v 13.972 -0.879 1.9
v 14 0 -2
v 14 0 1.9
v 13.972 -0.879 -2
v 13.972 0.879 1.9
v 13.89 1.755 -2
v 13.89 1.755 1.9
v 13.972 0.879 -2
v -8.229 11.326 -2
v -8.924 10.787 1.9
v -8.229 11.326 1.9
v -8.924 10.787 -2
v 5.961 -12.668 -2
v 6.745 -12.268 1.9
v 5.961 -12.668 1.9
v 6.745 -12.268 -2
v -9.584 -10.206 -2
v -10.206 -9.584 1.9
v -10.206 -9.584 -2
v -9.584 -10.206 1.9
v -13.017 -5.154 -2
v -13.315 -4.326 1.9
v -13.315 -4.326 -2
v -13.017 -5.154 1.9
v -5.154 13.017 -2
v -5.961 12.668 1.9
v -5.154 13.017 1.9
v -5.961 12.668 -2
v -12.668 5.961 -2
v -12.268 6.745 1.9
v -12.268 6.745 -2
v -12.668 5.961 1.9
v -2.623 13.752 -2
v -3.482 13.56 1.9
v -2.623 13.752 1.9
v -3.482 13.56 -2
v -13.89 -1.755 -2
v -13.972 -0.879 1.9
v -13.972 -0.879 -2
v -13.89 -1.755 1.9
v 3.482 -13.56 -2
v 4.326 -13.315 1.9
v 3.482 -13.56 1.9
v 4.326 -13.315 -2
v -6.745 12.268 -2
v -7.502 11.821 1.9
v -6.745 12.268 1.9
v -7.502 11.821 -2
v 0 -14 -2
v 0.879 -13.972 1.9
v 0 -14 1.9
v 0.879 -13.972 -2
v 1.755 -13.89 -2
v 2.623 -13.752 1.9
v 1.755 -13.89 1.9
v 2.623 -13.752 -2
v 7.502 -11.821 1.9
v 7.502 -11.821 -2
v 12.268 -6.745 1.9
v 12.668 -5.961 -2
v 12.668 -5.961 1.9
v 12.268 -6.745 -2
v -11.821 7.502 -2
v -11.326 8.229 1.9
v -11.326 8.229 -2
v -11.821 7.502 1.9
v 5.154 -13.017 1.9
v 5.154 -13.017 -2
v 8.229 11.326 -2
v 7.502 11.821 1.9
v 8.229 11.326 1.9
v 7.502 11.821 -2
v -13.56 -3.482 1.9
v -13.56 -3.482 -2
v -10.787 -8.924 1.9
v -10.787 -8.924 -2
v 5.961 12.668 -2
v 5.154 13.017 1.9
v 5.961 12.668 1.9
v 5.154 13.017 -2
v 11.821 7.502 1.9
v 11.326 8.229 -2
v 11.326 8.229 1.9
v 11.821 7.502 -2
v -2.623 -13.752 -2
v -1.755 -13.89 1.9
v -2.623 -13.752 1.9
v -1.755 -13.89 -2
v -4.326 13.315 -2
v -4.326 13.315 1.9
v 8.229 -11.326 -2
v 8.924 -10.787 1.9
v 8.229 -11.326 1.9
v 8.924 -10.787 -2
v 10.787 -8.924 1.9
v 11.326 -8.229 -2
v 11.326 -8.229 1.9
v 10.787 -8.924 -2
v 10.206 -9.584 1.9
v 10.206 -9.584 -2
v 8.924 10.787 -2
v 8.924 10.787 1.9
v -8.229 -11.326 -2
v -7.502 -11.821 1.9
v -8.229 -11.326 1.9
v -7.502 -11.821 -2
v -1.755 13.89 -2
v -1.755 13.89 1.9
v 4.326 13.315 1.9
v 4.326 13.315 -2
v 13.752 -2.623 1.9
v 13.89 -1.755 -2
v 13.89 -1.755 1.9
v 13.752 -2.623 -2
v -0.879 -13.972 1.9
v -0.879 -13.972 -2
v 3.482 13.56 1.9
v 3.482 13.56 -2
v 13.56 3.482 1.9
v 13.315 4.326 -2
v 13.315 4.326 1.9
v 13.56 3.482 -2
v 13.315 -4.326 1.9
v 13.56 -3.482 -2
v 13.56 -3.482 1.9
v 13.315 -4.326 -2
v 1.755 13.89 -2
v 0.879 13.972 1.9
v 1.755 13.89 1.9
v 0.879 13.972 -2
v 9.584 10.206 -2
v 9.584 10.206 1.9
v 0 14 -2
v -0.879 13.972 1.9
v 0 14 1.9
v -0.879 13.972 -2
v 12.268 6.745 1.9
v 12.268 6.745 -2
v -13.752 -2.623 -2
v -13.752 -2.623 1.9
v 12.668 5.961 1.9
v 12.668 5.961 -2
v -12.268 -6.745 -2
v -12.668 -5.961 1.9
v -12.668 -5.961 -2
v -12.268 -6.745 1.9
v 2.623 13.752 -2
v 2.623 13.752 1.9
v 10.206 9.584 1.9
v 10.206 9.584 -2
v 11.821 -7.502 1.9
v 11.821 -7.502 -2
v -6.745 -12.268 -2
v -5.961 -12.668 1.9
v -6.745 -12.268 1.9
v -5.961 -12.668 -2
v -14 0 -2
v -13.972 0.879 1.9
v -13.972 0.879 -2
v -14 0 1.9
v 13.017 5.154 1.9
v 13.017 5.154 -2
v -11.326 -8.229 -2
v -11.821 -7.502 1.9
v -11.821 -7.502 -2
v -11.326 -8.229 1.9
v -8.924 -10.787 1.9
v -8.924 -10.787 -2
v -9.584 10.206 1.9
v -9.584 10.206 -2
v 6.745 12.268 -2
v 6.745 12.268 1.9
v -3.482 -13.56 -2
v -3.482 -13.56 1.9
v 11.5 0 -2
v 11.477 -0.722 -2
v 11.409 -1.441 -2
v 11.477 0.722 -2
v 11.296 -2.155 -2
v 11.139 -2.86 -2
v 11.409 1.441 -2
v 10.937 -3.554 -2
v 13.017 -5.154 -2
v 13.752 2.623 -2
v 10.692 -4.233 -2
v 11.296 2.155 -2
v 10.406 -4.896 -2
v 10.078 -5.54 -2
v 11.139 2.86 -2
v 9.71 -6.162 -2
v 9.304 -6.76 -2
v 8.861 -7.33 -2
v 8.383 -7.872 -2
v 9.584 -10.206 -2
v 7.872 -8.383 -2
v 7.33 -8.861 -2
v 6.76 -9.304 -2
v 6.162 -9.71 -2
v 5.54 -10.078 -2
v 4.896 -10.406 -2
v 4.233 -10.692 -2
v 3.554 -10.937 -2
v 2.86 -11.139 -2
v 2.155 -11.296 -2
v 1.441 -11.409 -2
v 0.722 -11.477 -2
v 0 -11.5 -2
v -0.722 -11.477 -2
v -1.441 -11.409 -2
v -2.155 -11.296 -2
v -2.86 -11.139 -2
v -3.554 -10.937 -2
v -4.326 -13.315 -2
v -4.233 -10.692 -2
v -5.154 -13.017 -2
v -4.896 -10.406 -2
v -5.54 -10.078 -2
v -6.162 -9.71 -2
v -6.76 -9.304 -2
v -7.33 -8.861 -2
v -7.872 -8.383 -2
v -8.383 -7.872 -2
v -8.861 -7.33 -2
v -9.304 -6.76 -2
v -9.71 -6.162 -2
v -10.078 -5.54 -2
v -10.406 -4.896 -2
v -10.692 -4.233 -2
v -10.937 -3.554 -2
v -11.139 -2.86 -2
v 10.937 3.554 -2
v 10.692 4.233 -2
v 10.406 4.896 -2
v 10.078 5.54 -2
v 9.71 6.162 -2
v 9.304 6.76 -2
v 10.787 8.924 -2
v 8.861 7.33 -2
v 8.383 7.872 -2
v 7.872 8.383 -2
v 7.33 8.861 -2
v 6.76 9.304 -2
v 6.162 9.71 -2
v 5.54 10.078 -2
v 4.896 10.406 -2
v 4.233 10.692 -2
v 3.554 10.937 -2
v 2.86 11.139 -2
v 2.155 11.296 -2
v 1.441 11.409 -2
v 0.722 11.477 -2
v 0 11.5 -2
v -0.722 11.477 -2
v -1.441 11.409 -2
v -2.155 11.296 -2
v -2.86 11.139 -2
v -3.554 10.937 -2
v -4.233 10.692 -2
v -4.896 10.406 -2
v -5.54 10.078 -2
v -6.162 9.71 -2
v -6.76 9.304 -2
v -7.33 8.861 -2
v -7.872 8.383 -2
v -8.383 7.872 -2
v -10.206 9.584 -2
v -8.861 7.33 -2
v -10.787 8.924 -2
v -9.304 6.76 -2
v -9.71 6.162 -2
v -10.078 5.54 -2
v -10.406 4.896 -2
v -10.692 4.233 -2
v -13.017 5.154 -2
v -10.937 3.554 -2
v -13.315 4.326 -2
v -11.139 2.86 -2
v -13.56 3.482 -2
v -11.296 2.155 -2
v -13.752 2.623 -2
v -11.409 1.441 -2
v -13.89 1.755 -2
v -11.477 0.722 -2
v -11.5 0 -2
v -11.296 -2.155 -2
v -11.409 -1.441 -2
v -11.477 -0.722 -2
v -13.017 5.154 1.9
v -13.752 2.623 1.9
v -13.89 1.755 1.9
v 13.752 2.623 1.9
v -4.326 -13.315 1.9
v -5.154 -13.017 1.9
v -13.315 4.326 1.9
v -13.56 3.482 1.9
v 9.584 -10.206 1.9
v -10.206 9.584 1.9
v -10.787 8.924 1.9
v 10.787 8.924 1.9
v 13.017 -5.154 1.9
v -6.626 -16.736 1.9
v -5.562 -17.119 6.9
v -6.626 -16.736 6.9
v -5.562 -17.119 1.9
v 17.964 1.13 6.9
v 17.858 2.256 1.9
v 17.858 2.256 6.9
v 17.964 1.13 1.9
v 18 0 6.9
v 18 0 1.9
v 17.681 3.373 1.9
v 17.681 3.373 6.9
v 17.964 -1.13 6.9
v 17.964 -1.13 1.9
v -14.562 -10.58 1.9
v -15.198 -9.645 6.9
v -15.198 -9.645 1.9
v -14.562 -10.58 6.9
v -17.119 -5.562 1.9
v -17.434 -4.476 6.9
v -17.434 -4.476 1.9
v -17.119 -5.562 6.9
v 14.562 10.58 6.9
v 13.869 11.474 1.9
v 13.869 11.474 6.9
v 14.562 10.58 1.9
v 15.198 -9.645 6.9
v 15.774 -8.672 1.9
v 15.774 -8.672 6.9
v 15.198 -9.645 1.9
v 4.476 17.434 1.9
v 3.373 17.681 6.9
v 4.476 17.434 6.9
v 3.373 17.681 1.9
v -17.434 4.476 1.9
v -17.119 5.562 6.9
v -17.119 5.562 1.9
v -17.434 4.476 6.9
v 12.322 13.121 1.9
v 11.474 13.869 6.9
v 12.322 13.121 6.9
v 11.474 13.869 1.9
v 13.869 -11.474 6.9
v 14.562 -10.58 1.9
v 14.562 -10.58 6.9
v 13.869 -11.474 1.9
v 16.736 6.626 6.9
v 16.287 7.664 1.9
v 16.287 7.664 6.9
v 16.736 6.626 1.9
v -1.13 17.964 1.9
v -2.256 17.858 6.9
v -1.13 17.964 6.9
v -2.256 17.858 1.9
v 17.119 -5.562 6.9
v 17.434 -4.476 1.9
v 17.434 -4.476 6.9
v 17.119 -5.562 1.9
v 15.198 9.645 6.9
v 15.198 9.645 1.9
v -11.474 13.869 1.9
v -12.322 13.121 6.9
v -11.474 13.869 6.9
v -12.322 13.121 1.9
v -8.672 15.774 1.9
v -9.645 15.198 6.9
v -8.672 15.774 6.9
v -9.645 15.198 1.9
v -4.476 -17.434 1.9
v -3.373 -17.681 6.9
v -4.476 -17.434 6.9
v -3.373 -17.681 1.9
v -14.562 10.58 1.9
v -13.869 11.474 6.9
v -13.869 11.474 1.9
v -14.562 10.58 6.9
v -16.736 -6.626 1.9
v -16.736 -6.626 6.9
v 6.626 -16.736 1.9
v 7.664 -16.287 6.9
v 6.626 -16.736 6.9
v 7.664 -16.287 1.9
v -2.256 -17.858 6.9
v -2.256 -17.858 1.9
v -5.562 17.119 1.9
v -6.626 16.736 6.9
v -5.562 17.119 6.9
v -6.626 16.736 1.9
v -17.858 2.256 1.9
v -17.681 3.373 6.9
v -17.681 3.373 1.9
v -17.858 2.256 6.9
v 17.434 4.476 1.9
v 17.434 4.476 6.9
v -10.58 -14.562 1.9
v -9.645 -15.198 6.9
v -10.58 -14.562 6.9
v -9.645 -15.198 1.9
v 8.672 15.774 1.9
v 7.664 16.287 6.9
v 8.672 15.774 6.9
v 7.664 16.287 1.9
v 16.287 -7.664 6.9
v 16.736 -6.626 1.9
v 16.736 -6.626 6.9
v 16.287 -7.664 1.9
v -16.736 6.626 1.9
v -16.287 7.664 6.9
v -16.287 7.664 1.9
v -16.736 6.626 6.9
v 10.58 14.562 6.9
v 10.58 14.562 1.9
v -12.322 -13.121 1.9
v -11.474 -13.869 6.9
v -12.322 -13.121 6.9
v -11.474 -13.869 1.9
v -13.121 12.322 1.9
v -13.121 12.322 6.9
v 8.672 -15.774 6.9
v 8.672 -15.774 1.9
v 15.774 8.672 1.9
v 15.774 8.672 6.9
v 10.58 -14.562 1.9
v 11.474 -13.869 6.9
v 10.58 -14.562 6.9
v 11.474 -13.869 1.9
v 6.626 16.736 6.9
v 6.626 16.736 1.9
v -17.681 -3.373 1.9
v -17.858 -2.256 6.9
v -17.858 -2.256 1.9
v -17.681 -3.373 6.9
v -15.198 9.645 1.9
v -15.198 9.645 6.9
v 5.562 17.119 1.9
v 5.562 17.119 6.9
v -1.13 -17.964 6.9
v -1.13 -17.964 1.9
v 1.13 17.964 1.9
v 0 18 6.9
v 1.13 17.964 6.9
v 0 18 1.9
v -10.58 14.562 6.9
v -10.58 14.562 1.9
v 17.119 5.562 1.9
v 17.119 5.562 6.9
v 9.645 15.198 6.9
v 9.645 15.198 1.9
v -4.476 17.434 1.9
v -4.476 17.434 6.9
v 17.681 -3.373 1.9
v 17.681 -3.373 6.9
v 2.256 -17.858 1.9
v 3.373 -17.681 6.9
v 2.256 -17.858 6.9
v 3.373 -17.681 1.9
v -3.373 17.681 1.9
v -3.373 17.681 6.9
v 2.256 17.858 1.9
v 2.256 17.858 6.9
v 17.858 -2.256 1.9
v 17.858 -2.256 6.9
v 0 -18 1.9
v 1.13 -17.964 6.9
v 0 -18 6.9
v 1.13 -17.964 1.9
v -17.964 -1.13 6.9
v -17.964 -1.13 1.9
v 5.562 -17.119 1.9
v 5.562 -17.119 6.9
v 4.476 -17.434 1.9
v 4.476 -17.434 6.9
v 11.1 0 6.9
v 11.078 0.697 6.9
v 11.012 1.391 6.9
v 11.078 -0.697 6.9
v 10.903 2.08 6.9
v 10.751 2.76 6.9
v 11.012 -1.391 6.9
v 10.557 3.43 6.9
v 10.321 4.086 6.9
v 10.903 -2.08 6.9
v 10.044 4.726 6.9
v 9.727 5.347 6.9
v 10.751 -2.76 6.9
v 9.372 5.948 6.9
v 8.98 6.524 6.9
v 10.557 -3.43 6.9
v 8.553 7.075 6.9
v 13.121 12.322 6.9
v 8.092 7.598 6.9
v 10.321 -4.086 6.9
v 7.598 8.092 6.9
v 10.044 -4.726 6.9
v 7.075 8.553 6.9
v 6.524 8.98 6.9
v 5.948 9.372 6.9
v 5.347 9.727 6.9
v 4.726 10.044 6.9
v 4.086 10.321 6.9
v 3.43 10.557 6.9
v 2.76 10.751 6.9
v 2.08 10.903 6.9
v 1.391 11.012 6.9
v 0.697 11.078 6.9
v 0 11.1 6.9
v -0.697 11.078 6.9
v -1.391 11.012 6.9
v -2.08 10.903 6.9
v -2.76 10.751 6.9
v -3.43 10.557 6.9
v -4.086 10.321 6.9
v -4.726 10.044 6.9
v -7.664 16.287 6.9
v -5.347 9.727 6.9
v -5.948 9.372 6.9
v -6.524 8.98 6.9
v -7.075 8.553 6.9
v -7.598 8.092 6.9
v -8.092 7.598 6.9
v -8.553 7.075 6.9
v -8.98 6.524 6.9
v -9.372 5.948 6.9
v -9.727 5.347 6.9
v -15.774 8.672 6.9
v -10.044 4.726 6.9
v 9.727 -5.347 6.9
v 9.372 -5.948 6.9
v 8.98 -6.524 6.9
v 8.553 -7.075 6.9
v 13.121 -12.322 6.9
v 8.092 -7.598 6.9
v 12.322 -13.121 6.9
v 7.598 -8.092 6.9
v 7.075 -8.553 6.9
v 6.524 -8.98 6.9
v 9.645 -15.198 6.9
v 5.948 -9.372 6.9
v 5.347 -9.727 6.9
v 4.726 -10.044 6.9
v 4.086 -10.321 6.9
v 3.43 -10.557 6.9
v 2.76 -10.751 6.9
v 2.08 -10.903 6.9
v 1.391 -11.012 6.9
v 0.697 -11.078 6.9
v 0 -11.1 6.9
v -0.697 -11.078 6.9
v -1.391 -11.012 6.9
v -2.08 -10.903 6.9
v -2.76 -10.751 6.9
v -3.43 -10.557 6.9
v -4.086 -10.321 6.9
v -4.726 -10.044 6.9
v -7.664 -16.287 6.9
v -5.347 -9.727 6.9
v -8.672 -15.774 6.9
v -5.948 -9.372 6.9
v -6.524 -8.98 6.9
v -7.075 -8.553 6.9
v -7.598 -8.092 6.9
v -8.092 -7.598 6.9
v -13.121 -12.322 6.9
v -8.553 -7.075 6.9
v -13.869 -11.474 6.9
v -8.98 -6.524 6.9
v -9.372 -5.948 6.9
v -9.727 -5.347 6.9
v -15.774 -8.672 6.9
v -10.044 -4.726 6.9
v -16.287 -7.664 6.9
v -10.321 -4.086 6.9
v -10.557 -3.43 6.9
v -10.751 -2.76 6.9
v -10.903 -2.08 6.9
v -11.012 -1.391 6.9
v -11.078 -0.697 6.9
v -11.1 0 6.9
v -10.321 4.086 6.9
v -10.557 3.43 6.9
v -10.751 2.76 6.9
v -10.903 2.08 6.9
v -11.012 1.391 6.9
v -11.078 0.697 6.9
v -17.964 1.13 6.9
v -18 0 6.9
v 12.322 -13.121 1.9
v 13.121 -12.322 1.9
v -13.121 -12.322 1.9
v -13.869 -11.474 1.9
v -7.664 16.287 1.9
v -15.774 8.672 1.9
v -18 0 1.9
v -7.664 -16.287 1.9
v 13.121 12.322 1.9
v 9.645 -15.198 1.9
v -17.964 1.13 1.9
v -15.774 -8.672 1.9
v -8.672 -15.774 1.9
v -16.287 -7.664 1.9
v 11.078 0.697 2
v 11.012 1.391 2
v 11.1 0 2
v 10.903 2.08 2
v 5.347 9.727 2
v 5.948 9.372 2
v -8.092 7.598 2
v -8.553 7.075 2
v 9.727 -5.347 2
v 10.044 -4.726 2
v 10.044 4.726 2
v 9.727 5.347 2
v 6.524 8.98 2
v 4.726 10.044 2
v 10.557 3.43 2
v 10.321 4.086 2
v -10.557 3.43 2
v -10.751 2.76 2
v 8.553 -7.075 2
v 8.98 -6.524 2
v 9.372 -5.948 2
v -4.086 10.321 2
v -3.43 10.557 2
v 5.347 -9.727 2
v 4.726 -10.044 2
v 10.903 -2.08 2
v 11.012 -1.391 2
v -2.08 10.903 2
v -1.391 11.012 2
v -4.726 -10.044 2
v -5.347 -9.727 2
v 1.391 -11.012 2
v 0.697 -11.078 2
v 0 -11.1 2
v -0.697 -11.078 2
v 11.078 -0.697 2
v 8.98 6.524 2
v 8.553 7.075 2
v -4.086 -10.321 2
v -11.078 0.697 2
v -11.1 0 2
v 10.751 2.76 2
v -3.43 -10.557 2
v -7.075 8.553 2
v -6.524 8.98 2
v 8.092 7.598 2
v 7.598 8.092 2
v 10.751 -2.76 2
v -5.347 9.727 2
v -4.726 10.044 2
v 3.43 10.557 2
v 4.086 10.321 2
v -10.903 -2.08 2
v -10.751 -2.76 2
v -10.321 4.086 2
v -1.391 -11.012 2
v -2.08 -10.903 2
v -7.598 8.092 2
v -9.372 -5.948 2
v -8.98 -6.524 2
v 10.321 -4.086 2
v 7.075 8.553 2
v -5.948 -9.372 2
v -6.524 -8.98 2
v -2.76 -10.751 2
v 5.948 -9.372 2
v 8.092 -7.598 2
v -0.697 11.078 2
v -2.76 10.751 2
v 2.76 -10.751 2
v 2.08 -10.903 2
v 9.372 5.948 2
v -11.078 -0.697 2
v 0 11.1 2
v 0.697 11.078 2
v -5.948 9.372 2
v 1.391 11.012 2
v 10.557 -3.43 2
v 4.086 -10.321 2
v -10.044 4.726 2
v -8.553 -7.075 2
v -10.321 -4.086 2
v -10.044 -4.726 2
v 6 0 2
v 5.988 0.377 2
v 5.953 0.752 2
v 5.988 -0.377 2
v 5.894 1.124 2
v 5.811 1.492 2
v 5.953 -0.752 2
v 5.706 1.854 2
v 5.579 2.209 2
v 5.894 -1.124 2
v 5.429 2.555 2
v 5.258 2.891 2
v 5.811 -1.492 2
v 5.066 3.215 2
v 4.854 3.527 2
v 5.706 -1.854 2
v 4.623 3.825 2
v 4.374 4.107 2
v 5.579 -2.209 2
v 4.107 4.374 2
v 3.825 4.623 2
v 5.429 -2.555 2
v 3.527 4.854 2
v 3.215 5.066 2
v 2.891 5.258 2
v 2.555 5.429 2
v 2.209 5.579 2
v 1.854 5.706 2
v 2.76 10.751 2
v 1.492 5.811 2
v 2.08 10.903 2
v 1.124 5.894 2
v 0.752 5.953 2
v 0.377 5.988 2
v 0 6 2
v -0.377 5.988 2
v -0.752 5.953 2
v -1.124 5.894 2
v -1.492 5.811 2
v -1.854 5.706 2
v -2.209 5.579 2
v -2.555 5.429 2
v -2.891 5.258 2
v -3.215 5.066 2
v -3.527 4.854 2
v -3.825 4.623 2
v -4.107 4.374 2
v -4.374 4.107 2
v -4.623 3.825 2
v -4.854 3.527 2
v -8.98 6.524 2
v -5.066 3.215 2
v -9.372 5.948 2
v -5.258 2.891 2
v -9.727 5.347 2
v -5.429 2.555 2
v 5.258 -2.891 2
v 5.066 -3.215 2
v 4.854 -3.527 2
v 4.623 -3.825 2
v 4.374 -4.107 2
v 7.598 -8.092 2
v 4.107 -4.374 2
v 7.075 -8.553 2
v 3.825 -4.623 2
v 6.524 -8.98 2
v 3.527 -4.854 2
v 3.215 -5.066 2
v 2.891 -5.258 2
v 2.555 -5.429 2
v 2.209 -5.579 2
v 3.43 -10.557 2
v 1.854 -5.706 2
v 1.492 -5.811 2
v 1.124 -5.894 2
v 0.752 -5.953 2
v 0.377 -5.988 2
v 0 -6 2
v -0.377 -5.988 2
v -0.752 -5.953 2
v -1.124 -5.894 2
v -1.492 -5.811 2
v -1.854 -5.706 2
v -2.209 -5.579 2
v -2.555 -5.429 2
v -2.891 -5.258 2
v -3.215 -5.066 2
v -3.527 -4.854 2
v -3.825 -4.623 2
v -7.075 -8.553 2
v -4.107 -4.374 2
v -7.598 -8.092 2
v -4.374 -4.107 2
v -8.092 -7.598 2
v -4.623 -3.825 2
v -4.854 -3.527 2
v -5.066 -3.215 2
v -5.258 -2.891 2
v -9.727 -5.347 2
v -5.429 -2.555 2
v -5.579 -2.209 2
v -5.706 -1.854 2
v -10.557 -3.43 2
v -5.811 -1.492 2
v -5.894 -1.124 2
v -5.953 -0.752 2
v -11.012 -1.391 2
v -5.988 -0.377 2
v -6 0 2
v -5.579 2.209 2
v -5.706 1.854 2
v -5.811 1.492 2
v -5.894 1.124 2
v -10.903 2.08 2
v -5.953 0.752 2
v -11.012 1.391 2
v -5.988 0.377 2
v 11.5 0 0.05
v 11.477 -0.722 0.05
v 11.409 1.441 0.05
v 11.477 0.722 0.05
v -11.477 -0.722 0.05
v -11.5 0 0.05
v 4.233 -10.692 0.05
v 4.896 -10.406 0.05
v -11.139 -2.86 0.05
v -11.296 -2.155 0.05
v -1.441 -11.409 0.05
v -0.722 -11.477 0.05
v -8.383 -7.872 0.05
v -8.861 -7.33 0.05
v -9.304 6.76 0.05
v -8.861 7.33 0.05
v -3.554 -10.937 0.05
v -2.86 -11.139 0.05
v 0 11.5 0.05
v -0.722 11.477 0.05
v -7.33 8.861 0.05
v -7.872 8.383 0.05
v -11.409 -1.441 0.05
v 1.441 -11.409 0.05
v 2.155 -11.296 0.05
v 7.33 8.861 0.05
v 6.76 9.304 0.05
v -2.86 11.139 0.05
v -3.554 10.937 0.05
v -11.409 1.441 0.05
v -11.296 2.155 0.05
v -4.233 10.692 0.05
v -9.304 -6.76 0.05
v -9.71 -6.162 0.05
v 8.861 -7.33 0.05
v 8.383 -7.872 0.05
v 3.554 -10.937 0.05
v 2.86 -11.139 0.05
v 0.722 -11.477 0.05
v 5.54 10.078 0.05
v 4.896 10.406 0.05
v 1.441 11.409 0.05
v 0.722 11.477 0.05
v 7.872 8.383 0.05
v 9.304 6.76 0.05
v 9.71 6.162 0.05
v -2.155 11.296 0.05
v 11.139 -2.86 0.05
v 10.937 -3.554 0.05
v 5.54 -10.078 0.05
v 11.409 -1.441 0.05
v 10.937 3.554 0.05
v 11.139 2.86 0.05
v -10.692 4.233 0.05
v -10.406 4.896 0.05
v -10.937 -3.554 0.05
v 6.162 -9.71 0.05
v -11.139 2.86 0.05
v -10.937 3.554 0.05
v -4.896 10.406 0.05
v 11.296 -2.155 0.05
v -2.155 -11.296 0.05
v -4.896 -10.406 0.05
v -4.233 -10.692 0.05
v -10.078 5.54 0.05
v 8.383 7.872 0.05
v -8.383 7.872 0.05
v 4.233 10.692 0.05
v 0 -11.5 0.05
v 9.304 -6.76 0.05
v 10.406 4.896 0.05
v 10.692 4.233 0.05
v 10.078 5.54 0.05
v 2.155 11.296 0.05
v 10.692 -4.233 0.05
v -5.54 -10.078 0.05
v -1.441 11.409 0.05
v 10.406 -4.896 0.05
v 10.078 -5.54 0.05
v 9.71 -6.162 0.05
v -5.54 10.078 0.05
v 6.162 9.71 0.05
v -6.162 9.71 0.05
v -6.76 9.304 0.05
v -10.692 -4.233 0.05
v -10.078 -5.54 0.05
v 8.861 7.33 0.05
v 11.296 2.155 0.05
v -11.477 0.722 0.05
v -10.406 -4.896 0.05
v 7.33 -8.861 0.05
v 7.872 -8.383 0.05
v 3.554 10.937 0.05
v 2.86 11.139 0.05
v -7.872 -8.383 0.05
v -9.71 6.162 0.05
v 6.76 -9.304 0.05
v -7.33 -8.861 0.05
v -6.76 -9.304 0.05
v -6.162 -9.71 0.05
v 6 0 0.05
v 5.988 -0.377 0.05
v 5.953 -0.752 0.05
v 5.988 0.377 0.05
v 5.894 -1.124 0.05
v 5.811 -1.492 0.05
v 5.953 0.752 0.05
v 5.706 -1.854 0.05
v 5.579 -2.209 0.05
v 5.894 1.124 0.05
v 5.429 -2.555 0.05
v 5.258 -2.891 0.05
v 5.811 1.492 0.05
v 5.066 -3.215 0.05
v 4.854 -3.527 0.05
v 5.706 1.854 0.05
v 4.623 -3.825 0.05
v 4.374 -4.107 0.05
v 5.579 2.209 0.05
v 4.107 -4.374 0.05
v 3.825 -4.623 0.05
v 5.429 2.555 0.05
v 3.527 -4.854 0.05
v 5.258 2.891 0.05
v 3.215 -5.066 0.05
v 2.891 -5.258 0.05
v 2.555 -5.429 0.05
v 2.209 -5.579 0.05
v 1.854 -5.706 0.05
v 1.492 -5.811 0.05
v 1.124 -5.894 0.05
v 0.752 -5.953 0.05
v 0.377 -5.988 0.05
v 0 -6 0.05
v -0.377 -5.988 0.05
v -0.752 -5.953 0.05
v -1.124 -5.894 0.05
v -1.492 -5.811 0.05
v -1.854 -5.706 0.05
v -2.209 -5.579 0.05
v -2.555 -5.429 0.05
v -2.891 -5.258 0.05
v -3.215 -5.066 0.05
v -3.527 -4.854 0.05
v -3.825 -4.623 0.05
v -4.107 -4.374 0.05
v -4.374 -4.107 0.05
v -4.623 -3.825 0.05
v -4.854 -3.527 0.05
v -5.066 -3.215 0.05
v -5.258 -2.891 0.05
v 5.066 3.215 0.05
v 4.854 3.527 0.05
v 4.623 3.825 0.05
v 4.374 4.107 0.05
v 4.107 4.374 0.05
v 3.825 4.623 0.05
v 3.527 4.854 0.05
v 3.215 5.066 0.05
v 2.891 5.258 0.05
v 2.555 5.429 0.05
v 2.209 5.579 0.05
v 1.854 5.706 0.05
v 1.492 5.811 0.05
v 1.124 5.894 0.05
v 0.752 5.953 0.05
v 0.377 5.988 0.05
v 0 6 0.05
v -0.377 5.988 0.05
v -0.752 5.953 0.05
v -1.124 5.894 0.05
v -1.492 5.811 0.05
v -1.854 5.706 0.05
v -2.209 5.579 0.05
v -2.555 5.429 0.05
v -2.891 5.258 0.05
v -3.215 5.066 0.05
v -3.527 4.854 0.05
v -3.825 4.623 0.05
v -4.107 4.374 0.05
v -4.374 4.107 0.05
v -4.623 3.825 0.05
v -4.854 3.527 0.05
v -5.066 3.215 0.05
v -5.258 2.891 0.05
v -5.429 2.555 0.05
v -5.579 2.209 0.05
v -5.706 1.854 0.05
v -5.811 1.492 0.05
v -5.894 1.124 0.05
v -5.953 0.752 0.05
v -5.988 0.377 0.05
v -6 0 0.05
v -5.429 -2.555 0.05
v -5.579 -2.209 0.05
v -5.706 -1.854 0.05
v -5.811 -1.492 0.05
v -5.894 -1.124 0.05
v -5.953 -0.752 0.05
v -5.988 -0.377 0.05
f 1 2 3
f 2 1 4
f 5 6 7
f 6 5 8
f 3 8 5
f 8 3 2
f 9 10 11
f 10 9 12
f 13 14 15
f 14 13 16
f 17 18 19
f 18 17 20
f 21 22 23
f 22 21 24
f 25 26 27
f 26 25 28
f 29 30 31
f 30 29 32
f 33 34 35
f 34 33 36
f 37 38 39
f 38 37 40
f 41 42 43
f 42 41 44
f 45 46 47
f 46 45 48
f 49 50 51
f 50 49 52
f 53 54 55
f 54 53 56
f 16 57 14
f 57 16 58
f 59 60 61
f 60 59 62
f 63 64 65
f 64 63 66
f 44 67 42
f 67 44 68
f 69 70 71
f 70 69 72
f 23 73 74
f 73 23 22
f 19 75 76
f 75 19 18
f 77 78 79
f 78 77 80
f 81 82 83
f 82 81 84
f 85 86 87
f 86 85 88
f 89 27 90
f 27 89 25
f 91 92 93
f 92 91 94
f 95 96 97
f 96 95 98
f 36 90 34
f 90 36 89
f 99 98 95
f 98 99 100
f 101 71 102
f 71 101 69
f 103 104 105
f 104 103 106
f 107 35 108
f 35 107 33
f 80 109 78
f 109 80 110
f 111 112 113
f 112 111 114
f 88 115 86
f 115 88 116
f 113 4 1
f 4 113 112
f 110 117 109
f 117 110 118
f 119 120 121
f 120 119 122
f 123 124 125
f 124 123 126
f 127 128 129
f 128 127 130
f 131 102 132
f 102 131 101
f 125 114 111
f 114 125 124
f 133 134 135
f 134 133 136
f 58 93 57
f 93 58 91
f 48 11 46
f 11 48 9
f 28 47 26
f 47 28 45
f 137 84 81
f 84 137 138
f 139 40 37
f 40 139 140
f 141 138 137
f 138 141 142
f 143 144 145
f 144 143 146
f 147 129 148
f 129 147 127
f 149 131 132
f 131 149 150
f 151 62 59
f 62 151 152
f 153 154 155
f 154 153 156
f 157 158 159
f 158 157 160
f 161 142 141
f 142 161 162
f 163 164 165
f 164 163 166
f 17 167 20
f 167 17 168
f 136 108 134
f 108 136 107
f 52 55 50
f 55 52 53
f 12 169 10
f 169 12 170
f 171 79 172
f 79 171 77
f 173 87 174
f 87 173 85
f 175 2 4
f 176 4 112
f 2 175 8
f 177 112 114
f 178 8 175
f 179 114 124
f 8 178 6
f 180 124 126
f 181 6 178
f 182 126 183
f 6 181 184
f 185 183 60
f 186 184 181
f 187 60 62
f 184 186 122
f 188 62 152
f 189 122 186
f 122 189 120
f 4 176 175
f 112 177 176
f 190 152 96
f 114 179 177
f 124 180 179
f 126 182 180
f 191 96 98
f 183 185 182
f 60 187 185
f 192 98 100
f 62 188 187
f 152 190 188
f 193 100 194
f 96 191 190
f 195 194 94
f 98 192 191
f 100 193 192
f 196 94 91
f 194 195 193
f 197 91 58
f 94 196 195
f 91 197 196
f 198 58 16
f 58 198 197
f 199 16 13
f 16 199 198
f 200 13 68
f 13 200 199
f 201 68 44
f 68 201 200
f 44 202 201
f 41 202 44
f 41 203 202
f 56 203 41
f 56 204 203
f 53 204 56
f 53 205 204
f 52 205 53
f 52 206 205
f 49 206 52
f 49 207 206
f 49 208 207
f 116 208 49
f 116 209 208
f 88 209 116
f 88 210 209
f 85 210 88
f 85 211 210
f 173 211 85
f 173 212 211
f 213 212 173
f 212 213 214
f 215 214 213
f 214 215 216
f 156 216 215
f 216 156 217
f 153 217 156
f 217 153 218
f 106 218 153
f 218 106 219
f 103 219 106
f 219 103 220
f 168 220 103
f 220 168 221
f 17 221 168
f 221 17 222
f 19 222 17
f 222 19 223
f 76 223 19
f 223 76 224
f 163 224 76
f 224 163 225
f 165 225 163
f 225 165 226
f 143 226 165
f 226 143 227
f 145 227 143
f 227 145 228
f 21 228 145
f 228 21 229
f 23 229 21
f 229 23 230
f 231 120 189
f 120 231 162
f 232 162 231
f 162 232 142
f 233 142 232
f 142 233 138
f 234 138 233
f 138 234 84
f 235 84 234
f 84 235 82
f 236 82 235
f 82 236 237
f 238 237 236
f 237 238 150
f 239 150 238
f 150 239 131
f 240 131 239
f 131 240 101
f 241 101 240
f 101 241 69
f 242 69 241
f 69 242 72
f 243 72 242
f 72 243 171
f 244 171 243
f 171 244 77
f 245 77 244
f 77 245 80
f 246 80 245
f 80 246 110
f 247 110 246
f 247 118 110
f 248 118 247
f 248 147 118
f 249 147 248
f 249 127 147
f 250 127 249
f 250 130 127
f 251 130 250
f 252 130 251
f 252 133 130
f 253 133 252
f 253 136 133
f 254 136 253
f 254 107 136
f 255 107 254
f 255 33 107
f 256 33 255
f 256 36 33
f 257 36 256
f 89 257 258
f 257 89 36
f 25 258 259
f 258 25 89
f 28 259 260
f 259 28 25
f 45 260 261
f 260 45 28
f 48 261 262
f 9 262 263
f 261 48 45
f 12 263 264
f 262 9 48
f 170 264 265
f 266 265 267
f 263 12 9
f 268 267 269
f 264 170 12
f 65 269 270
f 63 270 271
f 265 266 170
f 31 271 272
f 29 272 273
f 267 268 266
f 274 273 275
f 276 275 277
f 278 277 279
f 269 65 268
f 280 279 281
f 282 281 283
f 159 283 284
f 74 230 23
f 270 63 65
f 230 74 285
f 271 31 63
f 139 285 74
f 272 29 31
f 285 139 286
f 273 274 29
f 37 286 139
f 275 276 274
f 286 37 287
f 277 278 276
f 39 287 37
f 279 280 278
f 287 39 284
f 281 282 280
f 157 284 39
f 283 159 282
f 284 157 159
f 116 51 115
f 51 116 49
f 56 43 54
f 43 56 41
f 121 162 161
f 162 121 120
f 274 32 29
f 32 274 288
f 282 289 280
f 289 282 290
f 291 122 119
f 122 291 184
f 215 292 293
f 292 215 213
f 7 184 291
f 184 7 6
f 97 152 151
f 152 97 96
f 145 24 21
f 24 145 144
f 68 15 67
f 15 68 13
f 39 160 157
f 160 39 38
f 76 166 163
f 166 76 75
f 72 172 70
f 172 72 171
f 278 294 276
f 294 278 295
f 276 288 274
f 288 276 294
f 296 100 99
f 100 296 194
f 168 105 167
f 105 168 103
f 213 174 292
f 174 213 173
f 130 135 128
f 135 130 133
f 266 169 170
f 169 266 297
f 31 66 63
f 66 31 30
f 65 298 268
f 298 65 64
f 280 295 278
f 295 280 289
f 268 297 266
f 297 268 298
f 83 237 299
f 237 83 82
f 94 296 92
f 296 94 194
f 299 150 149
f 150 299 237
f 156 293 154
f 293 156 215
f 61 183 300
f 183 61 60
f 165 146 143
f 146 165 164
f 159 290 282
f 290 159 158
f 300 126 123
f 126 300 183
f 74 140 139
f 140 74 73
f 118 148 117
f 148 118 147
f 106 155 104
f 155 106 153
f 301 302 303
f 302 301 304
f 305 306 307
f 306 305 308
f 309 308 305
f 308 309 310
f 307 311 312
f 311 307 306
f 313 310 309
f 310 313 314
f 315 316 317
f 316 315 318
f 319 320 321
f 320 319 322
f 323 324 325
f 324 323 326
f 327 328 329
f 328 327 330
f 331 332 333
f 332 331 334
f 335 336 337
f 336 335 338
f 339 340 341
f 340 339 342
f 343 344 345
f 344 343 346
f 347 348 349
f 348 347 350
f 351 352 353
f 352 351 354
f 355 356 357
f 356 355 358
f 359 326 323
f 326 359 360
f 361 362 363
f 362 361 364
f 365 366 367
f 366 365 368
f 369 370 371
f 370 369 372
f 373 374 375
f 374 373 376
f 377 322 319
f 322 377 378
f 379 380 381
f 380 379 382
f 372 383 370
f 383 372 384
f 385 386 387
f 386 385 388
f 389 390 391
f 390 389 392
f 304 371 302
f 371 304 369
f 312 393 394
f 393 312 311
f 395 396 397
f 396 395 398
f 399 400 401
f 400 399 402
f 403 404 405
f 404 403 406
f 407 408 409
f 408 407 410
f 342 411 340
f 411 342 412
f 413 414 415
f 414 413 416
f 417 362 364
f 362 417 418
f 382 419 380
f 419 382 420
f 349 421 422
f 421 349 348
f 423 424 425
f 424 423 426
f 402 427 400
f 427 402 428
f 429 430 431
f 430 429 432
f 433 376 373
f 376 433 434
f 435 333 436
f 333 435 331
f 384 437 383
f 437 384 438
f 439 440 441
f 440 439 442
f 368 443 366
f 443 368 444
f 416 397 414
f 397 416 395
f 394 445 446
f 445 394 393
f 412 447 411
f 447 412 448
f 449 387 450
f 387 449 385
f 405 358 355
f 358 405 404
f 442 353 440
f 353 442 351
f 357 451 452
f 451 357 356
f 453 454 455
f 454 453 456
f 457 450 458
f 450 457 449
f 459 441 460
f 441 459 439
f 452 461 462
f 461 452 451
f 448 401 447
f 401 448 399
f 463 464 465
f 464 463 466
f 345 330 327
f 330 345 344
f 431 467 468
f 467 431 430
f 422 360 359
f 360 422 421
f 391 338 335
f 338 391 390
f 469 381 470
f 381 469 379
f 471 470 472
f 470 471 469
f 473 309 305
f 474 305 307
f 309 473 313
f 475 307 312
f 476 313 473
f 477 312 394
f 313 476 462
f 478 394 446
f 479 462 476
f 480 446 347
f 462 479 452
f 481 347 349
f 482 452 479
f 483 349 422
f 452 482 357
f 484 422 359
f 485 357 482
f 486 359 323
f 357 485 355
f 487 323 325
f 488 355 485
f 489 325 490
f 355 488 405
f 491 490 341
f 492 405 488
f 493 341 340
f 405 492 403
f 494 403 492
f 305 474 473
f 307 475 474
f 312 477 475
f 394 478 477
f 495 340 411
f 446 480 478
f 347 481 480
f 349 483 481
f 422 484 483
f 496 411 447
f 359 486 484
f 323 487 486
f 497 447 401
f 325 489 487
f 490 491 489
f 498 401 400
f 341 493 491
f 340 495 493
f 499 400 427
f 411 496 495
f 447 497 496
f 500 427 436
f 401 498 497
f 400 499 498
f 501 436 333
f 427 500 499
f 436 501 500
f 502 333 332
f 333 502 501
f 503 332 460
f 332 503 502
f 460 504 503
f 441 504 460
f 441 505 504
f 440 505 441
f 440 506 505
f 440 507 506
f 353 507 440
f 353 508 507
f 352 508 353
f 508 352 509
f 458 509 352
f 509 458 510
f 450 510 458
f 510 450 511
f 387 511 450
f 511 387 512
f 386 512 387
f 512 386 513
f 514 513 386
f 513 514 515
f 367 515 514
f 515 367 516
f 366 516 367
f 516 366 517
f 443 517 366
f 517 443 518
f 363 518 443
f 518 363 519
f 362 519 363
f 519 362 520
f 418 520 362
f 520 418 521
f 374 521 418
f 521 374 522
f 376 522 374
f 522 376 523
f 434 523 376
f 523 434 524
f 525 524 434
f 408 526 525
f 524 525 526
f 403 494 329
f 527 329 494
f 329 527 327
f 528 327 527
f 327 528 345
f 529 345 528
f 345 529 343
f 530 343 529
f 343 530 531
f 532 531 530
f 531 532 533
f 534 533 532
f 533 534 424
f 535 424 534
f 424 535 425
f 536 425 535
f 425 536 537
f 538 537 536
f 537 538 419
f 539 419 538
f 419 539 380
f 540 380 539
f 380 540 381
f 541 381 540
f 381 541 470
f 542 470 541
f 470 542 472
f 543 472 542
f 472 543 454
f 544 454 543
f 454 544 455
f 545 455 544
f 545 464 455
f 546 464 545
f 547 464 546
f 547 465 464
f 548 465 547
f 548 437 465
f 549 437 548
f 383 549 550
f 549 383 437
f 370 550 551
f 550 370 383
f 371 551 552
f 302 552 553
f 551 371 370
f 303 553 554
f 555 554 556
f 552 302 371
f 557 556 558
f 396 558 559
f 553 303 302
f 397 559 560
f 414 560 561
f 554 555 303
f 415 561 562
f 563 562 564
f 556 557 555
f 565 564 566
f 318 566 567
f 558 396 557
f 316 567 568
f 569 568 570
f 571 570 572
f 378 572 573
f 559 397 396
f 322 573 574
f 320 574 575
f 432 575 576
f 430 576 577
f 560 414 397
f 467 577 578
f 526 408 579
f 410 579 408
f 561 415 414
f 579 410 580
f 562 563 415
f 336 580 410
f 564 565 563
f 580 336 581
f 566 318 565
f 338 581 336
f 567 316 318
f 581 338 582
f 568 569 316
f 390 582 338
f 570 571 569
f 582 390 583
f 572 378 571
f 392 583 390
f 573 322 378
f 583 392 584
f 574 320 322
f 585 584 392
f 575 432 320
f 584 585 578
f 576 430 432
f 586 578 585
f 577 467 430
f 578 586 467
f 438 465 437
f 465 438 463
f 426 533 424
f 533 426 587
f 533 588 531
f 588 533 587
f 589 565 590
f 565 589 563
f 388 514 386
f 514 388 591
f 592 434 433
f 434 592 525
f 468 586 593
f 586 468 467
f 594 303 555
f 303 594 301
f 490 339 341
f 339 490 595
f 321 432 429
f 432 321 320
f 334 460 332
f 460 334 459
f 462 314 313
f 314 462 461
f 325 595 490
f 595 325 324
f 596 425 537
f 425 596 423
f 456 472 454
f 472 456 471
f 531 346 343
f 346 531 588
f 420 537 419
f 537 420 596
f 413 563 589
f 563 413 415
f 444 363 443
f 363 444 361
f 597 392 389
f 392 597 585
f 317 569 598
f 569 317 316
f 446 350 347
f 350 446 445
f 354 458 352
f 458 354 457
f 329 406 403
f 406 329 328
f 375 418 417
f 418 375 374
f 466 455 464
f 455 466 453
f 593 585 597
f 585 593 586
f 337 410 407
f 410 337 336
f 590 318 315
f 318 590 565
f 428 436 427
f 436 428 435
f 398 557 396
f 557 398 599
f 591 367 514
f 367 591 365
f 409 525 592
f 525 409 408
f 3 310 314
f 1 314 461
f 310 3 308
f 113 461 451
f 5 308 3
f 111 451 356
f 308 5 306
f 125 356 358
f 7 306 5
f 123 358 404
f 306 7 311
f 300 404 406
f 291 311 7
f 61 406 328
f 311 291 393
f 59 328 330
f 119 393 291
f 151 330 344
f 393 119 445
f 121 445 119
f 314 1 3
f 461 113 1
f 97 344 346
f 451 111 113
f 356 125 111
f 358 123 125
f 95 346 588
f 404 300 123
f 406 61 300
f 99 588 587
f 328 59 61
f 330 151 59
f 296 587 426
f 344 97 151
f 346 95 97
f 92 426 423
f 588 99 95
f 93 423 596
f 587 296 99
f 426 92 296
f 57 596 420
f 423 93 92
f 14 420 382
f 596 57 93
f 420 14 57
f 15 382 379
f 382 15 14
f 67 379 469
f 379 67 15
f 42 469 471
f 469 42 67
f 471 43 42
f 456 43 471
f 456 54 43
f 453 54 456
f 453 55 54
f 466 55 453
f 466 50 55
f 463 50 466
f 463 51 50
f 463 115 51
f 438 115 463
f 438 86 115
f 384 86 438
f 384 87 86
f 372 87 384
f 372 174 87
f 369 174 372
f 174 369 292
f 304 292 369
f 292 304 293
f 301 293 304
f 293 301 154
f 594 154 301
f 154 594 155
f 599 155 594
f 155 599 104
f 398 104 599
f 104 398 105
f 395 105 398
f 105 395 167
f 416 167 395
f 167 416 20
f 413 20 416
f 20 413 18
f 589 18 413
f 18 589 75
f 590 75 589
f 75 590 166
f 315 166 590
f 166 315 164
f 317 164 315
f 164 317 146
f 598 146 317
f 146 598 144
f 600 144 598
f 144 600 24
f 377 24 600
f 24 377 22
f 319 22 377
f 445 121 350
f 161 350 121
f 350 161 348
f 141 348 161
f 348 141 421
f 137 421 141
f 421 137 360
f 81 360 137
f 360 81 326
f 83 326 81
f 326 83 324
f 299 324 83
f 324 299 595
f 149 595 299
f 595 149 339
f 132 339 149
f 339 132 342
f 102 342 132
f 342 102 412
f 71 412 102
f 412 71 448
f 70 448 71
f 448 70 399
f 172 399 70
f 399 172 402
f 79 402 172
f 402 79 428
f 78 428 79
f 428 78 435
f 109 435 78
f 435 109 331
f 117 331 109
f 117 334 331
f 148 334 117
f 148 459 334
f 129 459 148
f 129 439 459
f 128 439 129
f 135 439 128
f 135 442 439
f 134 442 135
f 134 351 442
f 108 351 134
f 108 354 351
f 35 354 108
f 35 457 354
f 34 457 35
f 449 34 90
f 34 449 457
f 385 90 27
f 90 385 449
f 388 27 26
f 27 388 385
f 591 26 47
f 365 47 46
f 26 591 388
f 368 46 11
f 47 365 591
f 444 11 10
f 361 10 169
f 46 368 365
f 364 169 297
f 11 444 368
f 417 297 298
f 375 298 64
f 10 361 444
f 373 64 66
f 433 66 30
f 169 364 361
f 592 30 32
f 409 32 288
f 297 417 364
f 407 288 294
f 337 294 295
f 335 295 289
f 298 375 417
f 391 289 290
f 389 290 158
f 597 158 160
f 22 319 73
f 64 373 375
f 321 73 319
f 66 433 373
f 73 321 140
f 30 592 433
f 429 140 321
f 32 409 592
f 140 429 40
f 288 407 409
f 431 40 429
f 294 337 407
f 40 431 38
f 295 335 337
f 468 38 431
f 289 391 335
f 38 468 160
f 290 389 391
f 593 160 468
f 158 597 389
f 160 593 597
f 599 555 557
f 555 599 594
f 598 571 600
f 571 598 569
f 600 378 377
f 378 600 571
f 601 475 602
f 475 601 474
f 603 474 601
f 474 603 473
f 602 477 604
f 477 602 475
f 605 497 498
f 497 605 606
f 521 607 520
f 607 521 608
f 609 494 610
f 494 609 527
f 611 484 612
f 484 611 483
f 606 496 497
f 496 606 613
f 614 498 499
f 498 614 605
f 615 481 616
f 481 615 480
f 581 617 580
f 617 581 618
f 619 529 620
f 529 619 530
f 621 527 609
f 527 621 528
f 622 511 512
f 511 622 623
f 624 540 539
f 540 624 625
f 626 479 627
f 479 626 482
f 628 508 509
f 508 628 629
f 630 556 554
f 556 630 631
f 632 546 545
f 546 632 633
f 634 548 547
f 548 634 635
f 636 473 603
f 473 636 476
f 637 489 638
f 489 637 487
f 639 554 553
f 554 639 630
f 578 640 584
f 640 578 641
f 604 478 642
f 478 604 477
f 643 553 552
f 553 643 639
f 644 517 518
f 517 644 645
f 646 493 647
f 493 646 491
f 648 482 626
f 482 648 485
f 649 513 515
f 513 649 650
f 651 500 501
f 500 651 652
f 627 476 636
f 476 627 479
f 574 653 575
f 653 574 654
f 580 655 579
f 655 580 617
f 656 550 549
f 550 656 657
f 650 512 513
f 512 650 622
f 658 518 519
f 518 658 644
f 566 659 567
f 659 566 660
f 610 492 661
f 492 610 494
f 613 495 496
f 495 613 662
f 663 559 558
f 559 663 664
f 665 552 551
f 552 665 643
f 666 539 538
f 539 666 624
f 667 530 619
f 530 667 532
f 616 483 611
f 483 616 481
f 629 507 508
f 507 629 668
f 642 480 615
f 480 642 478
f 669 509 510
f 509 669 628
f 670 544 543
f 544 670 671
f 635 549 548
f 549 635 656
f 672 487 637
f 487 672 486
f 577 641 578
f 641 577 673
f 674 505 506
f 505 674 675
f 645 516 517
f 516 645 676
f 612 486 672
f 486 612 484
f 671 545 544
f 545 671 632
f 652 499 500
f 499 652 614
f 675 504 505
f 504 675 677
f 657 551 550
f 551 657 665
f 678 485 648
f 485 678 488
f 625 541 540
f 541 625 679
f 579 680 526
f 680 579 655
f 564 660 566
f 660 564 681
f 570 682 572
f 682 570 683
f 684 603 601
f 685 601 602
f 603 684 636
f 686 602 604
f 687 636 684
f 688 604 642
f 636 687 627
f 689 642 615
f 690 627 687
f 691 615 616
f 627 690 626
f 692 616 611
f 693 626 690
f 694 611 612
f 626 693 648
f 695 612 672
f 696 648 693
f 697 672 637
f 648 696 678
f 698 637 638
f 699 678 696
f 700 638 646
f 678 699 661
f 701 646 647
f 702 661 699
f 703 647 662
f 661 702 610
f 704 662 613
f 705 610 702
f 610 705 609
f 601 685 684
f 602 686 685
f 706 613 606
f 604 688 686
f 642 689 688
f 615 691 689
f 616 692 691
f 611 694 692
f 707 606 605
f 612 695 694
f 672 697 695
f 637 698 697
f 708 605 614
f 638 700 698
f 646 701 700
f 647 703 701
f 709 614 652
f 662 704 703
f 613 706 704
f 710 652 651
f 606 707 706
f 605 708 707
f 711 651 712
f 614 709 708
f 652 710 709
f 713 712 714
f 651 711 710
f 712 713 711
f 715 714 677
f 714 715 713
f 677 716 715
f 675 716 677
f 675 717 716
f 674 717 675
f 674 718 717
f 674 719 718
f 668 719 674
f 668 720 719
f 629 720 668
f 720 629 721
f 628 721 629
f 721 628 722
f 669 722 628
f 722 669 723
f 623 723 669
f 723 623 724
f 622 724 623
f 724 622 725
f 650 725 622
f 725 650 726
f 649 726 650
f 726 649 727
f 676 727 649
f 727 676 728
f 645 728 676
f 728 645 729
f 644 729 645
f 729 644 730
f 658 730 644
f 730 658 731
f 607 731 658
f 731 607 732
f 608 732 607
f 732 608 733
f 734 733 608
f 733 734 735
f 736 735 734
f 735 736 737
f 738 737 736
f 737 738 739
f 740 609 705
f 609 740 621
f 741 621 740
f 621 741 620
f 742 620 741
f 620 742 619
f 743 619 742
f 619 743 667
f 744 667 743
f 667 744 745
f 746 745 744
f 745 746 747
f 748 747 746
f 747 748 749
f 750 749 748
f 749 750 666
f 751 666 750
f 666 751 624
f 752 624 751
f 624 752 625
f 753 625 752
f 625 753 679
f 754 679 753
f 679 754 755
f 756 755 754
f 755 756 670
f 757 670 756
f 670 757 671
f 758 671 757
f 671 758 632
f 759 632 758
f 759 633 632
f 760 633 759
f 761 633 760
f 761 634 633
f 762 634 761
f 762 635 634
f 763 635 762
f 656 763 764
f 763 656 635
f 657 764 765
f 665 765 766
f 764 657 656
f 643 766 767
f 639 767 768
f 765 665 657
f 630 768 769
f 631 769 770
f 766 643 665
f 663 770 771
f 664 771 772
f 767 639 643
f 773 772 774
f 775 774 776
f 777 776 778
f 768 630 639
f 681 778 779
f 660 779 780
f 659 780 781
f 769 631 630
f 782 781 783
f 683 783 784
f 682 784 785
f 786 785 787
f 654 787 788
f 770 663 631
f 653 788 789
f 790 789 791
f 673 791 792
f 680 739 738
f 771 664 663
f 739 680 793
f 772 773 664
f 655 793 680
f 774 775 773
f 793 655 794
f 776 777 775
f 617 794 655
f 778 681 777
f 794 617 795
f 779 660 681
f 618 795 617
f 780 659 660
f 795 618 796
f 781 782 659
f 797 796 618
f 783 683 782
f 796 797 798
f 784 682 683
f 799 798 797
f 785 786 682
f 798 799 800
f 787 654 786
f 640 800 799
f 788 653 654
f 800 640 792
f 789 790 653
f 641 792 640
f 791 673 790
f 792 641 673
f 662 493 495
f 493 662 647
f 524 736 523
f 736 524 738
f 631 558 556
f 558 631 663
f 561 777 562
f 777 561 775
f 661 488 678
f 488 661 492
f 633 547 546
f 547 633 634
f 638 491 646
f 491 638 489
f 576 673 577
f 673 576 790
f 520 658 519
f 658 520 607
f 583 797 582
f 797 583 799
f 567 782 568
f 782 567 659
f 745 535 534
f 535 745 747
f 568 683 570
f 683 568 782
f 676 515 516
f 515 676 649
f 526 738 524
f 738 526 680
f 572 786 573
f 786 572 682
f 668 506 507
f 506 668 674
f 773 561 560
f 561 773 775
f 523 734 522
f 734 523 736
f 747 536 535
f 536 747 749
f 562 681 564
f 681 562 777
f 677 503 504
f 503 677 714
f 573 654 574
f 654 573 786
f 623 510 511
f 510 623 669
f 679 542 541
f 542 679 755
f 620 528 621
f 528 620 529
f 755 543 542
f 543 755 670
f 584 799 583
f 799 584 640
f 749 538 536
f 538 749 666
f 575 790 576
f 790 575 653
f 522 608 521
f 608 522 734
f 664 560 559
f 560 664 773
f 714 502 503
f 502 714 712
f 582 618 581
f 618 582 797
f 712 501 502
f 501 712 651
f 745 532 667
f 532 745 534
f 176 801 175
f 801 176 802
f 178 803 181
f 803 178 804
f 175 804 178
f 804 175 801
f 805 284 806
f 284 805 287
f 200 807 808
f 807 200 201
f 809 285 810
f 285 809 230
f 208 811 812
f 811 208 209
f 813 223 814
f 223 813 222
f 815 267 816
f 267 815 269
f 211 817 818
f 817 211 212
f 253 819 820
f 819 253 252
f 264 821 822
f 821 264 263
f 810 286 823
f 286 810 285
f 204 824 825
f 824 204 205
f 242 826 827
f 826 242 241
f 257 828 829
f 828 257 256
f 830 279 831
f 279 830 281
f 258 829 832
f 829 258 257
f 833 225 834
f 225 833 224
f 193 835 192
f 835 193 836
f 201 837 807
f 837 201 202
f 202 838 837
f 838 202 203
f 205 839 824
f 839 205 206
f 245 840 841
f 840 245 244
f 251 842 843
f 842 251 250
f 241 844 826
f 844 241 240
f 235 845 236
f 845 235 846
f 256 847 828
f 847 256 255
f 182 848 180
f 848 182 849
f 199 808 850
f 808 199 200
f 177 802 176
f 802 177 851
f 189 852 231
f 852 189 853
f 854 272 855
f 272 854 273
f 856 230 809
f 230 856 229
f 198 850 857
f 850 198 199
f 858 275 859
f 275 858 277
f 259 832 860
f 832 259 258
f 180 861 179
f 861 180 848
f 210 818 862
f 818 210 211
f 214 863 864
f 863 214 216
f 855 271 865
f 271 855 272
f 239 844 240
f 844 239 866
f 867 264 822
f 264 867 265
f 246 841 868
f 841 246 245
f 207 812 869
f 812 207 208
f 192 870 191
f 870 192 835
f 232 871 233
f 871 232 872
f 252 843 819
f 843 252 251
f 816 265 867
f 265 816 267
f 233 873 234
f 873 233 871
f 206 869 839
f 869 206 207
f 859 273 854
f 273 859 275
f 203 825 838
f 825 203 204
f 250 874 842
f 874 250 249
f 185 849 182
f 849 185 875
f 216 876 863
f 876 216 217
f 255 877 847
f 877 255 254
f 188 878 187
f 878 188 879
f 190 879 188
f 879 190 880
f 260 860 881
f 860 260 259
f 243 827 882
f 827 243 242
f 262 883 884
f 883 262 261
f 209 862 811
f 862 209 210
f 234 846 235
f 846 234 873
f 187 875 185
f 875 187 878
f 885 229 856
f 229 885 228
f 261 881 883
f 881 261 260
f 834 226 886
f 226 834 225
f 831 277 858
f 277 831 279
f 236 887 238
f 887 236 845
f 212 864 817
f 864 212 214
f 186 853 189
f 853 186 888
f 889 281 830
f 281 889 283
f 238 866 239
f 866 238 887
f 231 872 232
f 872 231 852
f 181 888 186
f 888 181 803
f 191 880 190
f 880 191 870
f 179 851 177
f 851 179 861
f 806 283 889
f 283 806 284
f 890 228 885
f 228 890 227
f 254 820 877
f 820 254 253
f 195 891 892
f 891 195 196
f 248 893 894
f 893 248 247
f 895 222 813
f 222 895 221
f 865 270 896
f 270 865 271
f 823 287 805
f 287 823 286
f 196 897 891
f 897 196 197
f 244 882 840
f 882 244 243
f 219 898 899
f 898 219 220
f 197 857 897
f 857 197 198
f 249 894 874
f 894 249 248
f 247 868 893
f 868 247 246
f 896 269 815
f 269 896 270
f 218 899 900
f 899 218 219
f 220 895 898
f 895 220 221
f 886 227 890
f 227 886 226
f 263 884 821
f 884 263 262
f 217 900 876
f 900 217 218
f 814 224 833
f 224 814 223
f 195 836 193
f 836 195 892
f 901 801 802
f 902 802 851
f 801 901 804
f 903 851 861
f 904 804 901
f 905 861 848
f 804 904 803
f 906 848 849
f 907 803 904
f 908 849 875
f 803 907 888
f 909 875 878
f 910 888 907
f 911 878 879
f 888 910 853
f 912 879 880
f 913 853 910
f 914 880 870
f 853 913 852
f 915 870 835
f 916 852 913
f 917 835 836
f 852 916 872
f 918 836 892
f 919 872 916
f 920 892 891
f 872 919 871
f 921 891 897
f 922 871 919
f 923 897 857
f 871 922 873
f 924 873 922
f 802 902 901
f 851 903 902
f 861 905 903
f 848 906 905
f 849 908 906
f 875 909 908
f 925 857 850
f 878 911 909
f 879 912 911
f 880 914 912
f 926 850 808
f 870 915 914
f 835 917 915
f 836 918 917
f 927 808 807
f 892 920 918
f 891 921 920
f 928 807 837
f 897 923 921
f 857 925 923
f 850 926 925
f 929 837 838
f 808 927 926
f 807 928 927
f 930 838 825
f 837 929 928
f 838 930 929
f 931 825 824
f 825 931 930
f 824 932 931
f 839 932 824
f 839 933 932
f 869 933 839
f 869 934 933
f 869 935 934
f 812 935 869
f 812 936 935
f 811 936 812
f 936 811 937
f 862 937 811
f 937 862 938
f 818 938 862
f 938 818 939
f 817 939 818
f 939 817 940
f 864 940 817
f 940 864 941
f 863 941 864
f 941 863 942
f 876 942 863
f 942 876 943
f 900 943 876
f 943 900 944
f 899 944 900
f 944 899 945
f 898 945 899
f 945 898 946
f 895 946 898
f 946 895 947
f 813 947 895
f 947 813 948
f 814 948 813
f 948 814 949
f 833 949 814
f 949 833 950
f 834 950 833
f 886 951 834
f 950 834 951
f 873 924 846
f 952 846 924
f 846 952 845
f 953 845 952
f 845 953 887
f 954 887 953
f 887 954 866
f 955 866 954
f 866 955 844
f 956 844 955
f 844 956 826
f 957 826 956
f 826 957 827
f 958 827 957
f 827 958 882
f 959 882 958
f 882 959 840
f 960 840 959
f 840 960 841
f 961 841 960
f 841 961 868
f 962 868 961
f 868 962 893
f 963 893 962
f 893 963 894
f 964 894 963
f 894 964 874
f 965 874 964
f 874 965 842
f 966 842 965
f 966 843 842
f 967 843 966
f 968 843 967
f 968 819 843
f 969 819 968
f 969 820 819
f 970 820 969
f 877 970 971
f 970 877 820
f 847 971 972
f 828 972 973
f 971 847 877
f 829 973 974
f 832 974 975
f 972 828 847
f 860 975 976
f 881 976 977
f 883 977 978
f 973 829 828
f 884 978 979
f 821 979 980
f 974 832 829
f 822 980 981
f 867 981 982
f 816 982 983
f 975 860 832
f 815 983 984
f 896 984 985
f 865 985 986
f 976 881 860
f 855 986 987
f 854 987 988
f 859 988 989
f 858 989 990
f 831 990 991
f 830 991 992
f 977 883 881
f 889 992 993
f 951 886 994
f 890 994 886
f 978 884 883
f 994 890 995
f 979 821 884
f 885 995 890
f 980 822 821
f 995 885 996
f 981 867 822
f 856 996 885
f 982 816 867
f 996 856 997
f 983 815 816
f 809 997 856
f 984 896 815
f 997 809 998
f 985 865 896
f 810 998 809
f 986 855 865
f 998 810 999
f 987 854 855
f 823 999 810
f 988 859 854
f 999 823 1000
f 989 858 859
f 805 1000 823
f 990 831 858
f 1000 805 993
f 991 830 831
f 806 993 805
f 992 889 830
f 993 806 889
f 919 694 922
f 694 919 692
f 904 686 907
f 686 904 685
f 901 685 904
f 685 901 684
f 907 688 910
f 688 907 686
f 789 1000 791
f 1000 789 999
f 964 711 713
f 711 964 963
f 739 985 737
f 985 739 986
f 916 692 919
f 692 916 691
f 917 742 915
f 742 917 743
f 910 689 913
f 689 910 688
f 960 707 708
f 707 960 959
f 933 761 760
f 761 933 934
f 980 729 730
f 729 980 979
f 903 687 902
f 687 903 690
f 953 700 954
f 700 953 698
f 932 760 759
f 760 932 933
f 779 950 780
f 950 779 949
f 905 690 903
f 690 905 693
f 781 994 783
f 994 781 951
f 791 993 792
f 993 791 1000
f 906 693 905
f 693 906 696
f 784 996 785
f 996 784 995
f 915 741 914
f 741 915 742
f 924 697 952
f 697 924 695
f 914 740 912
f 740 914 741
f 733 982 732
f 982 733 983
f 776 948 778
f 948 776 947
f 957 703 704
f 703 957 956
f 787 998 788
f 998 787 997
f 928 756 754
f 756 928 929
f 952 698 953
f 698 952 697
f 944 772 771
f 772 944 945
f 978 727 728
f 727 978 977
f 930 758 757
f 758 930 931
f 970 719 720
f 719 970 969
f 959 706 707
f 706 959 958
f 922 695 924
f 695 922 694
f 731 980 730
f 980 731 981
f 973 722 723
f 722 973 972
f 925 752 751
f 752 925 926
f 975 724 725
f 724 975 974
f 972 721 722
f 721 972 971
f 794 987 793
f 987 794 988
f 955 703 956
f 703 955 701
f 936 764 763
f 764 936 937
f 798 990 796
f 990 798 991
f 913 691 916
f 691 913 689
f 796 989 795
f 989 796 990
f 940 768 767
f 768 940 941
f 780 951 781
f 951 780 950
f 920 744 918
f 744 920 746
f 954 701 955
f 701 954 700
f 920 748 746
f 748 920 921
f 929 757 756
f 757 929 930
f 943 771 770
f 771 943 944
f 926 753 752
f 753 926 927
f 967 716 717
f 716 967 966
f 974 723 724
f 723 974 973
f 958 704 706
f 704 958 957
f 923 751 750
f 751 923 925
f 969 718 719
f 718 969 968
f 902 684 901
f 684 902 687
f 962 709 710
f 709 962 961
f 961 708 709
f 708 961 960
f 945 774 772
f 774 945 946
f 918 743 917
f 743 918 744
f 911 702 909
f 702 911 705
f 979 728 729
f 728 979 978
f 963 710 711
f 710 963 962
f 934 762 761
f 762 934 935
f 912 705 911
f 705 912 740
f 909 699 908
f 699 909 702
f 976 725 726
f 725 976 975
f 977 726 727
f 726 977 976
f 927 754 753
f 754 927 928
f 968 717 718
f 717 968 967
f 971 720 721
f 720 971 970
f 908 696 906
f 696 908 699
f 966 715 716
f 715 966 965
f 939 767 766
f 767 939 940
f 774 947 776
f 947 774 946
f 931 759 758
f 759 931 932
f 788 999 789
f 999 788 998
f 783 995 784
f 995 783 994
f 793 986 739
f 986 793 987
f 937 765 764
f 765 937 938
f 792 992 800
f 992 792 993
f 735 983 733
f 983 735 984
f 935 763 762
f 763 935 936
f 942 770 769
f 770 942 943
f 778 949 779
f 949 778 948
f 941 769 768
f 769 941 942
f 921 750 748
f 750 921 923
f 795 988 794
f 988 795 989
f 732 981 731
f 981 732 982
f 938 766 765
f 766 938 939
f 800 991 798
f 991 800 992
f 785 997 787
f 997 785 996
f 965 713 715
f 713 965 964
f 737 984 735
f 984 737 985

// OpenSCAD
//solder station part radius
holder_r = 14;
// solder station part height
holder_h = 4;

// top part radius
holder_top_r = 18;
// top part height
holder_top_h = 5;


// bearing radius
bearing_r = 11;
// bearing part height
bearing_h = 7;
// bearing part inner radius
bearing_inner_r = 6;

//solder station part thickness
adapter_t = 5;

//clearance
cl=0.1;

$fn=100;

difference (){
    union(){
        cylinder(r=holder_r, h=holder_h, center=true);
       
        translate([0, 0, holder_h/2+holder_top_h/2-cl])
        cylinder(r=holder_top_r, h=holder_top_h, center=true);
    }
    union(){
        translate([0, 0, bearing_h/2+2])
        cylinder(r=bearing_r+cl, h=bearing_h, center=true);

        translate([0, 0, -2])
        cylinder(r=holder_r-adapter_t/2, h=holder_h+cl, center=true);

        cylinder(r=bearing_inner_r, h=100, center=true);
    }
}
